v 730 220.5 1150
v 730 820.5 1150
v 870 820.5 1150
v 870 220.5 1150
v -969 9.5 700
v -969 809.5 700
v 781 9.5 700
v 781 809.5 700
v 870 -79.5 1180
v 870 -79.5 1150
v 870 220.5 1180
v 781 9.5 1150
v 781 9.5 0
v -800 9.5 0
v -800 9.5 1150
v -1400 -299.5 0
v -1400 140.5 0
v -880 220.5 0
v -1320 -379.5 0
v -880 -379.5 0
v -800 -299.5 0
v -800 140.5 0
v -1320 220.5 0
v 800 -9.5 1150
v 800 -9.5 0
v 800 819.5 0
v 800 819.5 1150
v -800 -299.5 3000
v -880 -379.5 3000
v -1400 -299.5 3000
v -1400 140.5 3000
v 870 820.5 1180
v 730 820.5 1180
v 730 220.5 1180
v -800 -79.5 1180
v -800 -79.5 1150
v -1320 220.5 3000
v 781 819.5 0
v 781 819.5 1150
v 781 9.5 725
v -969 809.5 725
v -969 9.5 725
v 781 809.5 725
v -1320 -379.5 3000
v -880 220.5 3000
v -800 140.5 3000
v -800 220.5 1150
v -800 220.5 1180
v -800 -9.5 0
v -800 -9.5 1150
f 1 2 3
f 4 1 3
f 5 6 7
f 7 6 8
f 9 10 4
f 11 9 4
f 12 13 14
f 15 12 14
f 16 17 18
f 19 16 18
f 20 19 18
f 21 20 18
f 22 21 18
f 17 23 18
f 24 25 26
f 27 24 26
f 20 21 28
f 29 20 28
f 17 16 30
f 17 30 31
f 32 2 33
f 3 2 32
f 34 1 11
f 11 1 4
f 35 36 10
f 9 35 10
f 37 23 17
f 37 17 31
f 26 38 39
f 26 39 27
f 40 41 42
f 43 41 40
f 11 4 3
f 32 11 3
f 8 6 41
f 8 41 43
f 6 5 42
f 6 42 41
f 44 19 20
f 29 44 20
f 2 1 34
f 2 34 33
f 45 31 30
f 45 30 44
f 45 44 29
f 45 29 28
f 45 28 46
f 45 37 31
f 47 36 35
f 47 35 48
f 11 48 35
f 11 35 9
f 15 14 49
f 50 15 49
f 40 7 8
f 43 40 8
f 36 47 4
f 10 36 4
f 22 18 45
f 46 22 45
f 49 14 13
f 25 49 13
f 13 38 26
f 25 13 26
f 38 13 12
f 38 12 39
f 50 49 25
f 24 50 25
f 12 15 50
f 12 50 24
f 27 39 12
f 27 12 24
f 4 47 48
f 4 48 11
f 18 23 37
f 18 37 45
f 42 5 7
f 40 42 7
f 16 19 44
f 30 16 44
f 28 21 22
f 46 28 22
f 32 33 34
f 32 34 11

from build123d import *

# Parameters (mm, degrees)
F0_W      = 19
F0_H      = 810
F1_DEPTH  = 1150
F3_W      = 1750
F3_H      = 800
F4_DEPTH  = 25
F6_W      = 1670
F6_H      = 300
F7_DEPTH  = 30
F8_W      = 140
F8_H      = 600
F9_DEPTH  = 30
F10_W     = 600
F10_H     = 600
F11_DEPTH = 3000
F12_SIZE  = 80


with BuildPart() as f1:
    # F0 (on Top) → F1 (new body)
    with BuildSketch(Plane.XY):
        Polygon((800, -9.5), (800, 9.5), (781, 9.5), (-800, 9.5), (-800, -9.5), align=None)
        with Locations((790.5, 414.5)):
            Rectangle(F0_W, F0_H)
    extrude(amount=F1_DEPTH)


with BuildPart() as f4:
    # F3 (on offset) → F4 (new body)
    with BuildSketch(Plane.XY.offset(700)):
        with Locations((-94, 409.5)):
            Rectangle(F3_W, F3_H)
    extrude(amount=F4_DEPTH)


with BuildPart() as f7:
    # F6 (on offset) → F7 (new body)
    with BuildSketch(Plane.XY.offset(1150)):
        with Locations((35, 70.5)):
            Rectangle(F6_W, F6_H)
    extrude(amount=F7_DEPTH)


with BuildPart() as f9:
    # F8 (on offset) → F9 (new body)
    with BuildSketch(Plane.XY.offset(1150)):
        with Locations((800, 520.5)):
            Rectangle(F8_W, F8_H)
    extrude(amount=F9_DEPTH)


with BuildPart() as f11:
    # F10 (on Top) → F11 (new body)
    with BuildSketch(Plane.XY):
        with Locations((-1100, -79.5)):
            Rectangle(F10_W, F10_H)
    extrude(amount=F11_DEPTH)

    # F12
    f12_edges = [f11.edges().sort_by_distance(p)[0] for p in [
        (-800, 220.5, 1500),
        (-800, -379.5, 1500),
        (-1400, 220.5, 1500),
        (-1400, -379.5, 1500),
    ]]
    chamfer(f12_edges, length=F12_SIZE)


solid = Compound([f1.part, f4.part, f7.part, f9.part, f11.part])
